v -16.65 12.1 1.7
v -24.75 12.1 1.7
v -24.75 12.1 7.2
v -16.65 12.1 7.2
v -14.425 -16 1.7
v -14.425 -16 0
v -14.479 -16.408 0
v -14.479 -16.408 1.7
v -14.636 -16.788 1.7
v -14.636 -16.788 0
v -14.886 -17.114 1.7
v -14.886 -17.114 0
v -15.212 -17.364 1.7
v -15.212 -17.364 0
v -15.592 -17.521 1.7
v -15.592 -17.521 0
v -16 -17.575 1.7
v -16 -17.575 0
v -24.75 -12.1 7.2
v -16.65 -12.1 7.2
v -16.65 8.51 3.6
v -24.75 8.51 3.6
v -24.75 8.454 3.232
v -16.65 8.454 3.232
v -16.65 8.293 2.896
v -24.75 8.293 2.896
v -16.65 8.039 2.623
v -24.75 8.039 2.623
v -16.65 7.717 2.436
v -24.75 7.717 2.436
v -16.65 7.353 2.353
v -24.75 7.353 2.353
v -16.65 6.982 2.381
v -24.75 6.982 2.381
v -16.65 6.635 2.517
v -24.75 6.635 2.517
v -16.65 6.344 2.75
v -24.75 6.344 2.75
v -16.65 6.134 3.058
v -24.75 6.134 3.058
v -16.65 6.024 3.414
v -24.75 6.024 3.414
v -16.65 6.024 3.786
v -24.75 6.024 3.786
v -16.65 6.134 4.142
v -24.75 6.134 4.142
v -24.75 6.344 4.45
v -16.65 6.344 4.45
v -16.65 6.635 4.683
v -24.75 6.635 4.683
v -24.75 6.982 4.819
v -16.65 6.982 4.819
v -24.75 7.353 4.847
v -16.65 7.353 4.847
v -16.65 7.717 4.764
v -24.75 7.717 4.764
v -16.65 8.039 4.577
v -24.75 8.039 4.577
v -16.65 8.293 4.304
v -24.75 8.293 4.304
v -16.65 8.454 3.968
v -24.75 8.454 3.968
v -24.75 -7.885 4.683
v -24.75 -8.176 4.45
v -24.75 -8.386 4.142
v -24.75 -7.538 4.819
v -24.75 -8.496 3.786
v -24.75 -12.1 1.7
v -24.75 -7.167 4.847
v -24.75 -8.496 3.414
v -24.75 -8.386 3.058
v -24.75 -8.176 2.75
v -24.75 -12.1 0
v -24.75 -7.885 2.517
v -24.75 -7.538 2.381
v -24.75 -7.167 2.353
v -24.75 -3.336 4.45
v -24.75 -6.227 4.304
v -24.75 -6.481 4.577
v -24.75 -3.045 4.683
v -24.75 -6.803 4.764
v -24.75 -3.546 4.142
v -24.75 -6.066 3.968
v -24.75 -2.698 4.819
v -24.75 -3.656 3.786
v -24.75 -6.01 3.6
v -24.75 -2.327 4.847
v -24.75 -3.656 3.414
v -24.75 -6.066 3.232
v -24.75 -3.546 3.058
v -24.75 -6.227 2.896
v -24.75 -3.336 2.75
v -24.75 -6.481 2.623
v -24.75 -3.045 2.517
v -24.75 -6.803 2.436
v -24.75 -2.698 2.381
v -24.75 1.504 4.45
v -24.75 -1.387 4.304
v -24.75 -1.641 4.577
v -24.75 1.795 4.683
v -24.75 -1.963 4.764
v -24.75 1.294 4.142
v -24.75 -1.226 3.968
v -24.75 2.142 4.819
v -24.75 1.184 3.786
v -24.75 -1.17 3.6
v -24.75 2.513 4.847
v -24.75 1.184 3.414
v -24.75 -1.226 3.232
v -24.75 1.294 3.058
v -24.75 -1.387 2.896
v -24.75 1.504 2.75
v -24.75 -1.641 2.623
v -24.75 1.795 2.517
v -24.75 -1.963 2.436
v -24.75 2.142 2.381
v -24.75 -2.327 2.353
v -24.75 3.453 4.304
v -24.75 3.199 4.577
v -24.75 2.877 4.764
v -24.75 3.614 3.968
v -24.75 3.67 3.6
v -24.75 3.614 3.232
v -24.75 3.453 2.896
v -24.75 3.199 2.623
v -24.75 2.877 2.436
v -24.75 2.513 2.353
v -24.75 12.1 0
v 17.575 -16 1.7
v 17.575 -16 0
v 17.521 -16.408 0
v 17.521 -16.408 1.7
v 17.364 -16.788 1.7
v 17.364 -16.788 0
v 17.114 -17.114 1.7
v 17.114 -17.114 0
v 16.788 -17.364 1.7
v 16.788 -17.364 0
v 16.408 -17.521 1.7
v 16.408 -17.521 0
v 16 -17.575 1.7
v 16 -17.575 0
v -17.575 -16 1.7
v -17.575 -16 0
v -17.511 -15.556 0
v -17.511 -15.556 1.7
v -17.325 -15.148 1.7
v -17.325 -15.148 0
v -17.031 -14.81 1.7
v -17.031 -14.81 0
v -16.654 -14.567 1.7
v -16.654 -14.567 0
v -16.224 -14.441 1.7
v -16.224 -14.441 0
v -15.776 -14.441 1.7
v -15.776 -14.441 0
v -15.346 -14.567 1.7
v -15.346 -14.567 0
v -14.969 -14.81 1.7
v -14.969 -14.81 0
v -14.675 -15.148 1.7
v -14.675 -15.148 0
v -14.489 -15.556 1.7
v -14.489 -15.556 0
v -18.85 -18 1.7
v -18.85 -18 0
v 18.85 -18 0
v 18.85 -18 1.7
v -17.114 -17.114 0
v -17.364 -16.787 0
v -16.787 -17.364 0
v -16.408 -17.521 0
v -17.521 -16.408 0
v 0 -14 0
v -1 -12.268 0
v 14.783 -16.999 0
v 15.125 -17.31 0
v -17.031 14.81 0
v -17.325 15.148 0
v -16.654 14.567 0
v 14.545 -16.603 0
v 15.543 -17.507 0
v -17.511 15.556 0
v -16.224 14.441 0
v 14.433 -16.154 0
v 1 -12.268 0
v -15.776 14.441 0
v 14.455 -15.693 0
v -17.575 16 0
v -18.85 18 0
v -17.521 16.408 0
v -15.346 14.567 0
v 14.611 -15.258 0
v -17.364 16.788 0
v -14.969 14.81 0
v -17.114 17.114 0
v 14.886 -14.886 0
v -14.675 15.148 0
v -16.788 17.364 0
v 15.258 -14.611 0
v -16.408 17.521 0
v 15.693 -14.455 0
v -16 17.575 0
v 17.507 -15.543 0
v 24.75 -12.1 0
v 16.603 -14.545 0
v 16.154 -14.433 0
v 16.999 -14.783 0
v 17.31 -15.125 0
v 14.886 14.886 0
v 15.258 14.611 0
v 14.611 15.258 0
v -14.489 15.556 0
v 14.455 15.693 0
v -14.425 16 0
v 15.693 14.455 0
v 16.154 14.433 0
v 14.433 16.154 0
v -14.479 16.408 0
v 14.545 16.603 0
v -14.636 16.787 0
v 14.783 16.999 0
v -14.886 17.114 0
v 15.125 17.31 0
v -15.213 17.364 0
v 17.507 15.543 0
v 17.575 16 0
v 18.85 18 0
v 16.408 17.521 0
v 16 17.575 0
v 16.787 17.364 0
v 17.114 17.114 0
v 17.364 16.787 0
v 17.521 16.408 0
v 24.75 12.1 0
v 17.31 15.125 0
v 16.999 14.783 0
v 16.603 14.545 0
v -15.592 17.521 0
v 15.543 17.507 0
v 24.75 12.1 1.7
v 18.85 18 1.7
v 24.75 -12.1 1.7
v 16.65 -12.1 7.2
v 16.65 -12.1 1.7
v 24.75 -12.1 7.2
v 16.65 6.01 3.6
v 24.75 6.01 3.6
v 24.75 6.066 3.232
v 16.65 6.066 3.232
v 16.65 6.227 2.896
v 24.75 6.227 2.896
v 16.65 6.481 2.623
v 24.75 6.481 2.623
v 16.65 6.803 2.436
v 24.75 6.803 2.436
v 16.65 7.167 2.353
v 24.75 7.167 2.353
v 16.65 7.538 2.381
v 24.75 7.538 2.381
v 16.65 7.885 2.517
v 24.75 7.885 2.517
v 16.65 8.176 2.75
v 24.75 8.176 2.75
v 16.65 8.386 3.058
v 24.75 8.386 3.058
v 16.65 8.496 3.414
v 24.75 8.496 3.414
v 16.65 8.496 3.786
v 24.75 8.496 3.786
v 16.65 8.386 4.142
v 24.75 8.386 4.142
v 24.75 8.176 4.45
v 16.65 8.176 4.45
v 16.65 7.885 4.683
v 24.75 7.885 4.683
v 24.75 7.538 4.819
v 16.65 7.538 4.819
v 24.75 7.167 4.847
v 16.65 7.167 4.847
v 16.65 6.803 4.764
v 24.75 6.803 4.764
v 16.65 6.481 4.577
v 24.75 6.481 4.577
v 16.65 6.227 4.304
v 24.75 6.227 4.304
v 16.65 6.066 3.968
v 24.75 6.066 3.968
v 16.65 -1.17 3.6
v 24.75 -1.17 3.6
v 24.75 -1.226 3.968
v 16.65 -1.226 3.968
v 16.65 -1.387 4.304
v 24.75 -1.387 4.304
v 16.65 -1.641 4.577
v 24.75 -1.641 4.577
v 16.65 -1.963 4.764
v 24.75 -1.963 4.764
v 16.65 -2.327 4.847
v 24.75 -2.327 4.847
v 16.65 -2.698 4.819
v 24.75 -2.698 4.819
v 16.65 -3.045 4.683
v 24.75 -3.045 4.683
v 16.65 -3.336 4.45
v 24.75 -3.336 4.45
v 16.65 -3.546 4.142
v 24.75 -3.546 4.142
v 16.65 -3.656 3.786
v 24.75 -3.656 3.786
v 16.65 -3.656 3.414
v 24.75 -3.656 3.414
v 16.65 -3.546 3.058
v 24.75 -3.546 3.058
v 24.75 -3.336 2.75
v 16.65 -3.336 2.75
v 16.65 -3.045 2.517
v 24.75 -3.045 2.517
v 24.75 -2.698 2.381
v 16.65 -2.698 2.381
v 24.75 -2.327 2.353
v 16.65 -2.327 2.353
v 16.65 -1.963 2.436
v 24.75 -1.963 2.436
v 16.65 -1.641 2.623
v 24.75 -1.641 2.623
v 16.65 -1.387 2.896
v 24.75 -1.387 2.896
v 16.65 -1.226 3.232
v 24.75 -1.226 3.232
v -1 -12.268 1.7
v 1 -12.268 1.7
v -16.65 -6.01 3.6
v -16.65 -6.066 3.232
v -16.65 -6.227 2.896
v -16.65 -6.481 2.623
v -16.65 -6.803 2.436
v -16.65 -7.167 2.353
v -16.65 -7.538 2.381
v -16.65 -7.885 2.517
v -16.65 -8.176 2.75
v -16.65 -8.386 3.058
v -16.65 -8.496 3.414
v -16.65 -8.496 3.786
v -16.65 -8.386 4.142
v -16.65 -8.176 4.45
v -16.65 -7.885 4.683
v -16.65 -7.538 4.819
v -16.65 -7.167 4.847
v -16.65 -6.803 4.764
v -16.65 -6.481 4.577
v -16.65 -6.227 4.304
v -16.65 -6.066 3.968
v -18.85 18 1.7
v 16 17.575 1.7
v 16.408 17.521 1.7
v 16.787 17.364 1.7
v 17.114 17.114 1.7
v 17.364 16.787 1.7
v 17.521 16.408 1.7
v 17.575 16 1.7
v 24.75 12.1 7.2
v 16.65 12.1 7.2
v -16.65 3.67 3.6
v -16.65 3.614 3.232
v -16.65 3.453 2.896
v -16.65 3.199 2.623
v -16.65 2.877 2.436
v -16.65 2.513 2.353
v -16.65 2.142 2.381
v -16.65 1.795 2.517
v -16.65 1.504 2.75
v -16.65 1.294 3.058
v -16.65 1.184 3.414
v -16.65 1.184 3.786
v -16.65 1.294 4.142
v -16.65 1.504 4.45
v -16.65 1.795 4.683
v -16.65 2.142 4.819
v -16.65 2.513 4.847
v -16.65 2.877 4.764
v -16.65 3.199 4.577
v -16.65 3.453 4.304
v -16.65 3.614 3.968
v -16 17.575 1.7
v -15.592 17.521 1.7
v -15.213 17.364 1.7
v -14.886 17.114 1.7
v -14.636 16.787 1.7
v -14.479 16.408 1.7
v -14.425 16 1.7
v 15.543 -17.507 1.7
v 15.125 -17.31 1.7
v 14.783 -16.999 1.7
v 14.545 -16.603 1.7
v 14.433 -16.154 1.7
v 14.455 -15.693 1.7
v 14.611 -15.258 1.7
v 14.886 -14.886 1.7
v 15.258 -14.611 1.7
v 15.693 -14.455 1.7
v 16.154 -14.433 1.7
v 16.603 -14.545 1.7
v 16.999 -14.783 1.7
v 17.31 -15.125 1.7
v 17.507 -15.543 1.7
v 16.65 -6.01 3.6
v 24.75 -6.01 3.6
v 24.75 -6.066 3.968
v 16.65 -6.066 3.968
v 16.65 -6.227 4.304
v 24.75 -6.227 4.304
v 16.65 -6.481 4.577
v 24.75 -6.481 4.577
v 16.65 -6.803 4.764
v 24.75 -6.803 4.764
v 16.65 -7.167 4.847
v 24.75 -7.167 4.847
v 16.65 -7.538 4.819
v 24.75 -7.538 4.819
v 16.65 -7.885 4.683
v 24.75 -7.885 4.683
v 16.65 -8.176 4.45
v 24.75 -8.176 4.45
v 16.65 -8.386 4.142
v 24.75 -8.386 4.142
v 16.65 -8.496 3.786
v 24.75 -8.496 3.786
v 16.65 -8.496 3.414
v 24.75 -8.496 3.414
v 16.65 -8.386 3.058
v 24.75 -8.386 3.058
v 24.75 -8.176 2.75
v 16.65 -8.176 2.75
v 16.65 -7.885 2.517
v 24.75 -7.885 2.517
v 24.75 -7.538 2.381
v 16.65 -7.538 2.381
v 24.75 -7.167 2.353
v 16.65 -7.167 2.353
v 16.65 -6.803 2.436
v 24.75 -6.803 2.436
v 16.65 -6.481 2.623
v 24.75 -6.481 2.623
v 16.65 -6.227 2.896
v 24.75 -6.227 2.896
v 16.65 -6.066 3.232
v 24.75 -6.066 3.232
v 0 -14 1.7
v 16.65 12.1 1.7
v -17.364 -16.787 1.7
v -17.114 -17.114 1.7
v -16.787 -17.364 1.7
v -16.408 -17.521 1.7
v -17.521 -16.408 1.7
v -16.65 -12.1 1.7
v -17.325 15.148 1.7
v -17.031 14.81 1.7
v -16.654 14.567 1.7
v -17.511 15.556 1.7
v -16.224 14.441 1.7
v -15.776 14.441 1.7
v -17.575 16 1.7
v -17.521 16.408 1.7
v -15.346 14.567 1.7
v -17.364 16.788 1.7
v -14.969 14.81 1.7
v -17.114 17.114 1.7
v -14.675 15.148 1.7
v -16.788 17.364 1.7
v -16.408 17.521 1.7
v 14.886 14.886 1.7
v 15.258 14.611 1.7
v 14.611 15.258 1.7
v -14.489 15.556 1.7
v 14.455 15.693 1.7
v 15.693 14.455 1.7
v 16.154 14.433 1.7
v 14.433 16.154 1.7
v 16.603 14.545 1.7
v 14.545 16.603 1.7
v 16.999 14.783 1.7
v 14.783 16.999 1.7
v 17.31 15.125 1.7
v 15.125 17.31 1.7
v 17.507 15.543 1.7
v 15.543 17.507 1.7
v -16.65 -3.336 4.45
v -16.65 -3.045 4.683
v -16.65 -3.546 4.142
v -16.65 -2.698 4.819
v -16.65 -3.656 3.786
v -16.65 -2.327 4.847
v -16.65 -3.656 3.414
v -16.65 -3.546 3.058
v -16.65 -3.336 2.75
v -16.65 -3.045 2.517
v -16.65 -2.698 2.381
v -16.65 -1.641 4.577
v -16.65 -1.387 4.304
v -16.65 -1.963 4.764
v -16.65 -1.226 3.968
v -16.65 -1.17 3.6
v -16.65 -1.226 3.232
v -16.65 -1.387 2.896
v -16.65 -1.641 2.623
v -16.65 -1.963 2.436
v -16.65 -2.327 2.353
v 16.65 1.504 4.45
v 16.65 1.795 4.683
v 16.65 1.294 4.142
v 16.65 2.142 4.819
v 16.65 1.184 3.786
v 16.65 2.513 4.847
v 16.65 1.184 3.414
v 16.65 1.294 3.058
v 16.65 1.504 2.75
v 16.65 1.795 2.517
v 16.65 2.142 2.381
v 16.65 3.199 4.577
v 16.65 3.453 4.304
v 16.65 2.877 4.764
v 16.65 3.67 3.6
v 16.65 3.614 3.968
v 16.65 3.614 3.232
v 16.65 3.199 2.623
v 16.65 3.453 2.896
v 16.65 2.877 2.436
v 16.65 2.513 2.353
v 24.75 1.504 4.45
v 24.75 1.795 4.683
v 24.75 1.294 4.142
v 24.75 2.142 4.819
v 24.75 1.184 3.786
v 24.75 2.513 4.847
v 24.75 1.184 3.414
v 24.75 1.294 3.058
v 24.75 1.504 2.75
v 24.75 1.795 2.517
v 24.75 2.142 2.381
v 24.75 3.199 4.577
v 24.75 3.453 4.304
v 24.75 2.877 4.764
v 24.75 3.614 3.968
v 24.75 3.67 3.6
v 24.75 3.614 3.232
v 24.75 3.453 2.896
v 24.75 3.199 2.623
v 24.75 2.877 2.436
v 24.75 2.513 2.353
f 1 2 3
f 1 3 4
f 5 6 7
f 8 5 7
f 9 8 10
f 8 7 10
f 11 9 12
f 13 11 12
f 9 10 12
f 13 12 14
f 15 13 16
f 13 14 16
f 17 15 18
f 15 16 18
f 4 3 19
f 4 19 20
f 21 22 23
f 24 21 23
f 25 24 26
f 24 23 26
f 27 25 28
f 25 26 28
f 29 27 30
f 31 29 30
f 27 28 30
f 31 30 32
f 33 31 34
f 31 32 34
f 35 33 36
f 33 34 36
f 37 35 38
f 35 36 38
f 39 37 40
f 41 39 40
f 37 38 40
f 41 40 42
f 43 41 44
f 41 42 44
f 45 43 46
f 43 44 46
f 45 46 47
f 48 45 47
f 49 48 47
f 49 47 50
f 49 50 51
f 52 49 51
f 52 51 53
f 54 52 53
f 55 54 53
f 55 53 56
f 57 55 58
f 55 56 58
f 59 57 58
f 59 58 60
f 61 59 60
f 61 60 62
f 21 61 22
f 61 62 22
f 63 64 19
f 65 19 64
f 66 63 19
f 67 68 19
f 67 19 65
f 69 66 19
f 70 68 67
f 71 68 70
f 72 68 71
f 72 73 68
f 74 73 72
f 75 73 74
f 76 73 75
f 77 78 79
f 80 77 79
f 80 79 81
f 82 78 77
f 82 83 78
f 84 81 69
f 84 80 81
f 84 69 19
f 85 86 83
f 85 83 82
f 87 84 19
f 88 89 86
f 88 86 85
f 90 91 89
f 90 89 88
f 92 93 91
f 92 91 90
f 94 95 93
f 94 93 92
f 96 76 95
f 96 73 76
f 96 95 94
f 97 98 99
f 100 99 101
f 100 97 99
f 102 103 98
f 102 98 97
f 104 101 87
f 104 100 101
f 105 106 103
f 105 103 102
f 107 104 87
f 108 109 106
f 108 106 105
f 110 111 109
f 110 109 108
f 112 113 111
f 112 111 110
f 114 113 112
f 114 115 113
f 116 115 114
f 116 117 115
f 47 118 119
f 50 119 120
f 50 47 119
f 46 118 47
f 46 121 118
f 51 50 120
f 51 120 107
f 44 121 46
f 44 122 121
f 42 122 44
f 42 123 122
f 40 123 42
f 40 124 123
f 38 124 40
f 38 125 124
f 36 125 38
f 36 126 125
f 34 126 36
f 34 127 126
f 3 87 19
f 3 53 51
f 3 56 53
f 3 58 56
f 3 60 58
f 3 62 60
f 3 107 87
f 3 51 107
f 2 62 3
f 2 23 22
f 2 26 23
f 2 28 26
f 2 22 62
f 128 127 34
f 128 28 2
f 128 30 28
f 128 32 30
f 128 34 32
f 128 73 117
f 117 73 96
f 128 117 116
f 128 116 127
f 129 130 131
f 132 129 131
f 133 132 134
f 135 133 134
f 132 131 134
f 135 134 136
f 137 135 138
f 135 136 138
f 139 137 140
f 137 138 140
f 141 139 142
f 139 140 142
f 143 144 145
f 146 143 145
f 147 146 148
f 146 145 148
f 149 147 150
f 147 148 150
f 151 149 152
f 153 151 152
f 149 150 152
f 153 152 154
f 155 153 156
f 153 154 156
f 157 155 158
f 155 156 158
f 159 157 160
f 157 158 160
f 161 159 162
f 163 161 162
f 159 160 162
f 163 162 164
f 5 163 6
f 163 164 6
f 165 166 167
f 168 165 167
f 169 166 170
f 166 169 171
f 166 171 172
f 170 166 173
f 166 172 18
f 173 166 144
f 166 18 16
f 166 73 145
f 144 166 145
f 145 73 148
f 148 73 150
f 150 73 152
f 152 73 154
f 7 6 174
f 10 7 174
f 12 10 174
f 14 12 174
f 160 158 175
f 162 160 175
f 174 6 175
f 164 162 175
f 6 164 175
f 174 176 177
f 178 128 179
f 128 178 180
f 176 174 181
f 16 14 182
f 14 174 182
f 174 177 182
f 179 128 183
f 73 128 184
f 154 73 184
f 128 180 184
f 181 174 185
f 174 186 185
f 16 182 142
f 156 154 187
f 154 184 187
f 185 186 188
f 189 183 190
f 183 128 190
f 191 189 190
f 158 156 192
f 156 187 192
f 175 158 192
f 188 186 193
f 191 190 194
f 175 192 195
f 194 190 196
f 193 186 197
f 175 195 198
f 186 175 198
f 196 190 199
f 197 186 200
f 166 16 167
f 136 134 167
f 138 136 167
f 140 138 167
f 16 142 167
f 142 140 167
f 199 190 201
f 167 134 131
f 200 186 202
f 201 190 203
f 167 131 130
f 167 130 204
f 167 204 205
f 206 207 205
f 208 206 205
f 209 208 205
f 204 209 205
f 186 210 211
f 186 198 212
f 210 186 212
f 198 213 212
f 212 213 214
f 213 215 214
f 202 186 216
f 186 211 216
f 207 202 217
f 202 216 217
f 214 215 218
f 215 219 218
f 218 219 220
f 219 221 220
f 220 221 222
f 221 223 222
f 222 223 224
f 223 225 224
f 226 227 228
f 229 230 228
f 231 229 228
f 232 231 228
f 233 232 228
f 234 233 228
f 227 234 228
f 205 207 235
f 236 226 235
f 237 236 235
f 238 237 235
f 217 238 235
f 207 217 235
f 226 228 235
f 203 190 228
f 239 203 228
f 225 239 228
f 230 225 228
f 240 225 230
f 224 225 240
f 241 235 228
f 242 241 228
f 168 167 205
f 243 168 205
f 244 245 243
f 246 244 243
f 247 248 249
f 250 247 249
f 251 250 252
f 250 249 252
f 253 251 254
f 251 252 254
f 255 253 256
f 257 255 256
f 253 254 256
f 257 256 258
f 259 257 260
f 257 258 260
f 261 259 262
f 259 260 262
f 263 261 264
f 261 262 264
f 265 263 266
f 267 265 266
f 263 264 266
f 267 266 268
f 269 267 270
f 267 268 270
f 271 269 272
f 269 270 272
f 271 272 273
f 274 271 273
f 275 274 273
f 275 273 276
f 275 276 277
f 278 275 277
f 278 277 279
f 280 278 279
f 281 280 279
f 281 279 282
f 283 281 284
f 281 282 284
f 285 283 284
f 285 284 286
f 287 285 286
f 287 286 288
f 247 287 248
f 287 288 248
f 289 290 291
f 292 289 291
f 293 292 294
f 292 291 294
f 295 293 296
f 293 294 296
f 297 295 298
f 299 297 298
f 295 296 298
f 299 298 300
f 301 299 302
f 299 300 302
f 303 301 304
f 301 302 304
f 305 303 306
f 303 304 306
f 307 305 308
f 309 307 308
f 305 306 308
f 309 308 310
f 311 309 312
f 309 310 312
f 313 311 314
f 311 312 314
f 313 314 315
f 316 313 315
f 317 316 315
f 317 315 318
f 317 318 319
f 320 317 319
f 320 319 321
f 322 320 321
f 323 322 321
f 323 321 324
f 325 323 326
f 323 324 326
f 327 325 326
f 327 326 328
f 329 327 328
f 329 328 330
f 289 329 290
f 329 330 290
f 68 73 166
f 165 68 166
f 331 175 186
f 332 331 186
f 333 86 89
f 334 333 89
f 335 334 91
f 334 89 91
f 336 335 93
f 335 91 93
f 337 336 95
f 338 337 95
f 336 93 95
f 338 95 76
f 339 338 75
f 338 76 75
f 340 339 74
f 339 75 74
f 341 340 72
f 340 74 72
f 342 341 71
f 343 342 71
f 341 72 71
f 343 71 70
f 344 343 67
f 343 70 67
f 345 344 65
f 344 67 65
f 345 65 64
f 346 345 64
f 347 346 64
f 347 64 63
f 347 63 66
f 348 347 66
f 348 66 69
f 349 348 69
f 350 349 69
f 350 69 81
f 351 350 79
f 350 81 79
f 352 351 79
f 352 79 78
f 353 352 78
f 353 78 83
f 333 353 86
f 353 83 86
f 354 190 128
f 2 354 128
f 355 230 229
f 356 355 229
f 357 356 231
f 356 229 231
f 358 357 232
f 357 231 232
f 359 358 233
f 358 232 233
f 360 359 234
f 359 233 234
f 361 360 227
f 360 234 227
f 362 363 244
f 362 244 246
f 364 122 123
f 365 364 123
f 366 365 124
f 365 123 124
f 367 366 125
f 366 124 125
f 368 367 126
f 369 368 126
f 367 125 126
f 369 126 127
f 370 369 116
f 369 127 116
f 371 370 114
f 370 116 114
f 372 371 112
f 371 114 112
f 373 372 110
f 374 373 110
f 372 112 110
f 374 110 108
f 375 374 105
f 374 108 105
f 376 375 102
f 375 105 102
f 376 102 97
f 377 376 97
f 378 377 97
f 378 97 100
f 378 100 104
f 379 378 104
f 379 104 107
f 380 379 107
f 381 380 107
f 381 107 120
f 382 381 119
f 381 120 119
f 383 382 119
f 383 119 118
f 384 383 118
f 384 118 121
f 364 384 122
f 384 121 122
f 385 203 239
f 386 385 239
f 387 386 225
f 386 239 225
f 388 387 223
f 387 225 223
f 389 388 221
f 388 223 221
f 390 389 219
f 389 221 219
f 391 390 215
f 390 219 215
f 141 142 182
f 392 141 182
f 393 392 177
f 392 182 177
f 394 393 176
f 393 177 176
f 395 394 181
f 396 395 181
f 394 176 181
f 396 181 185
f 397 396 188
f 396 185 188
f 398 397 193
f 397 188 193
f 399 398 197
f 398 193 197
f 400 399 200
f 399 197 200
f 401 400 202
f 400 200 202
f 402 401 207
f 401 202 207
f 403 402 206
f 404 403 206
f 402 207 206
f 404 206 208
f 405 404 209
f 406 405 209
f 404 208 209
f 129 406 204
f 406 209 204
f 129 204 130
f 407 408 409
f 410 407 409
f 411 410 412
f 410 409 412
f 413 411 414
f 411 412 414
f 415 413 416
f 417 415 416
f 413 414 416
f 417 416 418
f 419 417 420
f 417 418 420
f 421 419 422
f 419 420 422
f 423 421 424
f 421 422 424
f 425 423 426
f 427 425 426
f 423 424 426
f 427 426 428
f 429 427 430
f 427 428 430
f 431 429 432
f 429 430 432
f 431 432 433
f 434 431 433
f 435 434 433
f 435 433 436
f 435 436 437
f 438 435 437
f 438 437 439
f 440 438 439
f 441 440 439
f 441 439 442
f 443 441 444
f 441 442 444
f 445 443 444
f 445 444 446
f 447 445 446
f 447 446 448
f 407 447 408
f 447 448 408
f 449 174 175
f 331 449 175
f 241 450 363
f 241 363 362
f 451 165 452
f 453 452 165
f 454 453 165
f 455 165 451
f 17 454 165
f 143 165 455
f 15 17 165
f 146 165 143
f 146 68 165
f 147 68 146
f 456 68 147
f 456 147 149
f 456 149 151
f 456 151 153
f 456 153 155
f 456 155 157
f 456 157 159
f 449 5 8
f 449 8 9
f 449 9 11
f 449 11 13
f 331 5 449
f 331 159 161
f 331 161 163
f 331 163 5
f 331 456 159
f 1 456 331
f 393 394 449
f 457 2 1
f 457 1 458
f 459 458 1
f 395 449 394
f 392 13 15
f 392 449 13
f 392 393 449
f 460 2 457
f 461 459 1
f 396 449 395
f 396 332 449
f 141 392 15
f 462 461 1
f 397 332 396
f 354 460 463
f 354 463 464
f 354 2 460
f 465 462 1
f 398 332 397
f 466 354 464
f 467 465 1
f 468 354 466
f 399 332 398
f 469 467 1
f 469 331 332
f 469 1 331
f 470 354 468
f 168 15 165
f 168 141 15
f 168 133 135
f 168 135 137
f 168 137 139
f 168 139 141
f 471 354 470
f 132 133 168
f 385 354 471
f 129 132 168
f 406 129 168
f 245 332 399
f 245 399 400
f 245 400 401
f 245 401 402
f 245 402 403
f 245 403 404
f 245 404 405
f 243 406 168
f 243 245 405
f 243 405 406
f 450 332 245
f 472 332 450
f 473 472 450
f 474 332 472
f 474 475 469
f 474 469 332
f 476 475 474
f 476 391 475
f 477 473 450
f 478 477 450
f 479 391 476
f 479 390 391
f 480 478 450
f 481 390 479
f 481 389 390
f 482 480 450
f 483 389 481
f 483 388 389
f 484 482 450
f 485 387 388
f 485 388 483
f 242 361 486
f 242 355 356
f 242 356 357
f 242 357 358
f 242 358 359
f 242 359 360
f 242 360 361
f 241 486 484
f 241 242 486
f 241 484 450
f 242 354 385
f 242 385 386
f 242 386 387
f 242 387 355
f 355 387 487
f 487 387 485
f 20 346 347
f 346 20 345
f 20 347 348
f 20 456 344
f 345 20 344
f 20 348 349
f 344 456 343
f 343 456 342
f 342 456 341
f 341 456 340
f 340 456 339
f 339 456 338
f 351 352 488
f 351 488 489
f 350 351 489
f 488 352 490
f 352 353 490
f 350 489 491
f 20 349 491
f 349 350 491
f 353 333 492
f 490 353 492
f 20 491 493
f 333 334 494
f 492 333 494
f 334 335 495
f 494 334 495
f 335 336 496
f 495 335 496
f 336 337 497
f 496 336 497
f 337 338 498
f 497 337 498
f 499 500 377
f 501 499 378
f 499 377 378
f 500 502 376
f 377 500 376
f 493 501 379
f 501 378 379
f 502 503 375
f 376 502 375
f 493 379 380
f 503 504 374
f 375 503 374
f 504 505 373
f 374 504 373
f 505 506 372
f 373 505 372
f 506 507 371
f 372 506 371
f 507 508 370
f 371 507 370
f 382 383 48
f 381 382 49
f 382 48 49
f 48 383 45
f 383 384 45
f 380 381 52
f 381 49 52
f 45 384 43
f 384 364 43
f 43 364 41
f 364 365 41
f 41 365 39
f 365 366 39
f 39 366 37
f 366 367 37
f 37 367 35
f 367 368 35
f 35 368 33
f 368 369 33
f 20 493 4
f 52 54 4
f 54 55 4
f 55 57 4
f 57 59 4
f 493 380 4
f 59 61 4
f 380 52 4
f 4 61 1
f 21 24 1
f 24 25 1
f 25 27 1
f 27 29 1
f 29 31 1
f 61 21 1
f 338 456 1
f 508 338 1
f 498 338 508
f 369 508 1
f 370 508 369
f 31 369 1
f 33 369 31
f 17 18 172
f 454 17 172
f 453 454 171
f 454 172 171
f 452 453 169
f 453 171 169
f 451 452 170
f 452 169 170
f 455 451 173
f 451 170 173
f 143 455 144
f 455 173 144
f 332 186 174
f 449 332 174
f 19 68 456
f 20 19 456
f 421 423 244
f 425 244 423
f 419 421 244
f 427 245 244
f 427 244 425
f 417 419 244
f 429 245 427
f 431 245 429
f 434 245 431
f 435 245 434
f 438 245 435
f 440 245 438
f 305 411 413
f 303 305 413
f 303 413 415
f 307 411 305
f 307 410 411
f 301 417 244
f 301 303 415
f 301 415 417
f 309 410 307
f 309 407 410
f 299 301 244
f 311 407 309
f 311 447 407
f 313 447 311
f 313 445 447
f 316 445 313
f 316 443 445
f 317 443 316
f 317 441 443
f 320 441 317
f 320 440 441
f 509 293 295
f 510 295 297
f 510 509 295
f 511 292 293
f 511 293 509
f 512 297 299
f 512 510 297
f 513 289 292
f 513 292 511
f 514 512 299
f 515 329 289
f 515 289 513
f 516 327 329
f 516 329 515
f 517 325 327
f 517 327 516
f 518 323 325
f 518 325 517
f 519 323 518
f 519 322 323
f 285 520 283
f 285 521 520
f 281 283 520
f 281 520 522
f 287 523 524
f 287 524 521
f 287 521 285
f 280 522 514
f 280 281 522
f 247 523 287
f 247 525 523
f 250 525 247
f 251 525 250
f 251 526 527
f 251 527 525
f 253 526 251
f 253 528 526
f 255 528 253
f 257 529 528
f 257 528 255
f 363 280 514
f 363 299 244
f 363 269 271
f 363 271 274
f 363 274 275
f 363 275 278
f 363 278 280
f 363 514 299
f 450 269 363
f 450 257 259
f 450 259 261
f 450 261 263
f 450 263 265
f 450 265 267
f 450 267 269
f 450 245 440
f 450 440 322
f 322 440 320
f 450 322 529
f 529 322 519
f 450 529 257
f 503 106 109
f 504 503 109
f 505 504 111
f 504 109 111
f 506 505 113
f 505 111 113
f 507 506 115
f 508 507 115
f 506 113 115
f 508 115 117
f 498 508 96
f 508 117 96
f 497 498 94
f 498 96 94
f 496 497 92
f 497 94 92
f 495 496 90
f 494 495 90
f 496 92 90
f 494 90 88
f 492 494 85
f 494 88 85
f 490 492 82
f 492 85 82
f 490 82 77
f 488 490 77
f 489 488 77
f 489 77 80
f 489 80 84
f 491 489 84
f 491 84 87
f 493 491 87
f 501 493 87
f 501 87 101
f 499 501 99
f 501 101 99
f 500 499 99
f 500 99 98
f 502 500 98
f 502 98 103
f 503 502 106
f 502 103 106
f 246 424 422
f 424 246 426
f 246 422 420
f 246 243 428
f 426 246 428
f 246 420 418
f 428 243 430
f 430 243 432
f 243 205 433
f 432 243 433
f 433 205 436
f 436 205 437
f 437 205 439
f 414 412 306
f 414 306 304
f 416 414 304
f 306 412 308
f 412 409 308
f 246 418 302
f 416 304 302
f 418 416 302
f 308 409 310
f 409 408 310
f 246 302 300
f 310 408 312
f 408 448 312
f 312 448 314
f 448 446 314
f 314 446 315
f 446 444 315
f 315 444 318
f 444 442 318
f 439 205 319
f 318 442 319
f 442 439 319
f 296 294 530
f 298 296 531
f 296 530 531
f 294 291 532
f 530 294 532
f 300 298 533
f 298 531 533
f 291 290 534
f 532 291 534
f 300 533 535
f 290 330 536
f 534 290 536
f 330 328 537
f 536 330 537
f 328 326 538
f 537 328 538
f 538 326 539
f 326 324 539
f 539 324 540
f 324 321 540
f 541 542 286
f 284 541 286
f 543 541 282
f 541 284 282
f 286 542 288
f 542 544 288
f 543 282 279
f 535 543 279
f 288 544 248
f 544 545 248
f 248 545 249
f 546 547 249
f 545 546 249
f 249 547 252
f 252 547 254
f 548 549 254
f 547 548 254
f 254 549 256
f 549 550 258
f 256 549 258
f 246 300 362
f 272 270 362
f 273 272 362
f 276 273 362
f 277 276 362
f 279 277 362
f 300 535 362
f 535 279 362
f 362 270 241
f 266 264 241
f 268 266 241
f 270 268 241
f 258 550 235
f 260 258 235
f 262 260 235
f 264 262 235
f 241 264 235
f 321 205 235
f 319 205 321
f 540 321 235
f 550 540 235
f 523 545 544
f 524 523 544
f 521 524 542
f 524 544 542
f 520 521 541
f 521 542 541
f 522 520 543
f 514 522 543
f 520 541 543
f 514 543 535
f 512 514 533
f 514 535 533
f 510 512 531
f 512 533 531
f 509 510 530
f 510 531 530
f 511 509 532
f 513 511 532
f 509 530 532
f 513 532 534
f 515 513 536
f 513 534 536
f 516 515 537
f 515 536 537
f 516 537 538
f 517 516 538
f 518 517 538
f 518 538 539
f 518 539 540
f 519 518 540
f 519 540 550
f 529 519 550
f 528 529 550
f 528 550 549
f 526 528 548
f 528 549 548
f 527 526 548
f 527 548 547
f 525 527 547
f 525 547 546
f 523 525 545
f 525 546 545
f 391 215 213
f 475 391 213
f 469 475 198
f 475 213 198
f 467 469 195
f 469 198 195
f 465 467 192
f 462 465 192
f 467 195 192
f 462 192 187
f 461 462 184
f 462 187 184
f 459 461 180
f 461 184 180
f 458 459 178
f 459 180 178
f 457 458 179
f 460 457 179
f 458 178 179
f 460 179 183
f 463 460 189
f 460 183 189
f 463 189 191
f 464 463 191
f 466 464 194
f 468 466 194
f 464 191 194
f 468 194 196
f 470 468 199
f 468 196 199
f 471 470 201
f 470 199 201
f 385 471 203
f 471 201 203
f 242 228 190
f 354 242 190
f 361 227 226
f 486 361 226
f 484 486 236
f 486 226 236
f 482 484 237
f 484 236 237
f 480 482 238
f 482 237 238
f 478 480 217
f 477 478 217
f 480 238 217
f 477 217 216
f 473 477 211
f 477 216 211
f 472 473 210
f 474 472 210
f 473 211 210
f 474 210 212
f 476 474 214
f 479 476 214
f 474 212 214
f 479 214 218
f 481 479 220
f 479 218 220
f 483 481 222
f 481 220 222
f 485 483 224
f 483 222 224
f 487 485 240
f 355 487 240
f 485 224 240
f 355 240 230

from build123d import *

# Parameters (mm, degrees)
F1_DEPTH = 1.7
F2_W     = 8.1
F2_H     = 24.2000000085
F3_DEPTH = 5.5
F6_DEPTH = 8.1
F7_DEPTH = 8.1


with BuildPart() as f1:
    # F0 (on Top) → F1 (new body)
    with BuildSketch(Plane.XY):
        with BuildLine():
            ThreePointArc((-17.5750000042, 16), (-17.1136931846, 17.1136931804), (-16.0000000042, 17.575))
            Line((-16.0000000042, 17.575), (-16.0000000042, 18))
            Line((-16.0000000042, 18), (-18.8500000085, 18))
            Line((-18.8500000085, 18), (-20.8500000085, 16))
            Line((-20.8500000085, 16), (-17.5750000042, 16))
        make_face()
        with BuildLine():
            ThreePointArc((-16.0000000042, 17.575), (-14.8863068239, 17.1136931804), (-14.4250000042, 16))
            ThreePointArc((-14.4250000042, 16), (-16.0000000042, 14.425), (-17.5750000042, 16))
            Line((-17.5750000042, 16), (-20.8500000085, 16))
            Line((-20.8500000085, 16), (-24.75, 12.1000000085))
            Line((-24.75, 12.1000000085), (-24.75, -12.1))
            Line((-24.75, -12.1), (-20.85, -16))
            Line((-20.85, -16), (-17.5749999958, -16))
            ThreePointArc((-17.5749999958, -16), (-15.9999999958, -14.425), (-14.4249999958, -16))
            ThreePointArc((-14.4249999958, -16), (-14.8863068154, -17.1136931804), (-15.9999999958, -17.575))
            Line((-15.9999999958, -17.575), (-15.9999999958, -18))
            Line((-15.9999999958, -18), (16.0000000042, -18))
            Line((16.0000000042, -18), (16.0000000042, -17.575))
            ThreePointArc((16.0000000042, -17.575), (14.8863068239, -14.8863068196), (17.5750000042, -16))
            Line((17.5750000042, -16), (20.8500000085, -16))
            Line((20.8500000085, -16), (24.75, -12.1000000085))
            Line((24.75, -12.1000000085), (24.75, 12.1))
            Line((24.75, 12.1), (20.85, 16))
            Line((20.85, 16), (17.5749999958, 16))
            ThreePointArc((17.5749999958, 16), (14.8863068154, 14.8863068196), (15.9999999958, 17.575))
            Line((15.9999999958, 17.575), (15.9999999958, 18))
            Line((15.9999999958, 18), (-16.0000000042, 18))
            Line((-16.0000000042, 18), (-16.0000000042, 17.575))
        make_face()
        Polygon((1, -12.2679491924), (0, -14), (-1, -12.2679491924), align=None, mode=Mode.SUBTRACT)
        with BuildLine():
            Line((18.85, 18), (15.9999999958, 18))
            Line((15.9999999958, 18), (15.9999999958, 17.575))
            ThreePointArc((15.9999999958, 17.575), (17.1136931761, 17.1136931804), (17.5749999958, 16))
            Line((17.5749999958, 16), (20.85, 16))
            Line((20.85, 16), (18.85, 18))
        make_face()
        with BuildLine():
            Line((18.8500000085, -18), (20.8500000085, -16))
            Line((20.8500000085, -16), (17.5750000042, -16))
            ThreePointArc((17.5750000042, -16), (17.1136931846, -17.1136931804), (16.0000000042, -17.575))
            Line((16.0000000042, -17.575), (16.0000000042, -18))
            Line((16.0000000042, -18), (18.8500000085, -18))
        make_face()
        with BuildLine():
            Line((-17.5749999958, -16), (-20.85, -16))
            Line((-20.85, -16), (-18.85, -18))
            Line((-18.85, -18), (-15.9999999958, -18))
            Line((-15.9999999958, -18), (-15.9999999958, -17.575))
            ThreePointArc((-15.9999999958, -17.575), (-17.1136931761, -17.1136931804), (-17.5749999958, -16))
        make_face()
    extrude(amount=F1_DEPTH)

    # F2 (on face) → F3 (join)
    with BuildSketch(Plane.XY.offset(1.7)):
        with Locations((-20.7, 4.2e-09)):
            Rectangle(F2_W, F2_H)
        with Locations((20.7, -4.2e-09)):
            Rectangle(F2_W, F2_H)
    extrude(amount=F3_DEPTH)

    # F5 (on face) → F6 (cut)
    with BuildSketch(Plane.YZ.offset(24.75)):
        with BuildLine():
            Line((6.0099999915, 3.6), (8.5099999915, 3.6))
            ThreePointArc((8.5099999915, 3.6), (7.2599999915, 4.85), (6.0099999915, 3.6))
        make_face()
        with BuildLine():
            ThreePointArc((6.0099999915, 3.6), (7.2599999915, 2.35), (8.5099999915, 3.6))
            Line((8.5099999915, 3.6), (6.0099999915, 3.6))
        make_face()
        with BuildLine():
            ThreePointArc((1.1699999915, 3.6), (2.4199999915, 2.35), (3.6699999915, 3.6))
            Line((3.6699999915, 3.6), (1.1699999915, 3.6))
        make_face()
        with BuildLine():
            Line((1.1699999915, 3.6), (3.6699999915, 3.6))
            ThreePointArc((3.6699999915, 3.6), (2.4199999915, 4.85), (1.1699999915, 3.6))
        make_face()
        with BuildLine():
            ThreePointArc((-3.6700000085, 3.6), (-2.4200000085, 2.35), (-1.1700000085, 3.6))
            Line((-1.1700000085, 3.6), (-3.6700000085, 3.6))
        make_face()
        with BuildLine():
            Line((-3.6700000085, 3.6), (-1.1700000085, 3.6))
            ThreePointArc((-1.1700000085, 3.6), (-2.4200000085, 4.85), (-3.6700000085, 3.6))
        make_face()
        with BuildLine():
            Line((-6.0100000085, 3.6), (-8.5100000085, 3.6))
            ThreePointArc((-8.5100000085, 3.6), (-7.2600000085, 2.35), (-6.0100000085, 3.6))
        make_face()
        with BuildLine():
            ThreePointArc((-6.0100000085, 3.6), (-7.2600000085, 4.85), (-8.5100000085, 3.6))
            Line((-8.5100000085, 3.6), (-6.0100000085, 3.6))
        make_face()
    extrude(amount=-F6_DEPTH, mode=Mode.SUBTRACT)

    # F4 (on face) → F7 (cut)
    with BuildSketch(Plane(origin=(-24.75, 0, 0), x_dir=(0, -1, 0), z_dir=(-1, 0, 0))):
        with BuildLine():
            Line((6.0099999915, 3.6), (8.5099999915, 3.6))
            ThreePointArc((8.5099999915, 3.6), (7.2599999915, 4.85), (6.0099999915, 3.6))
        make_face()
        with BuildLine():
            ThreePointArc((6.0099999915, 3.6), (7.2599999915, 2.35), (8.5099999915, 3.6))
            Line((8.5099999915, 3.6), (6.0099999915, 3.6))
        make_face()
        with BuildLine():
            Line((1.1699999915, 3.6), (3.6699999915, 3.6))
            ThreePointArc((3.6699999915, 3.6), (2.4199999915, 4.85), (1.1699999915, 3.6))
        make_face()
        with BuildLine():
            ThreePointArc((1.1699999915, 3.6), (2.4199999915, 2.35), (3.6699999915, 3.6))
            Line((3.6699999915, 3.6), (1.1699999915, 3.6))
        make_face()
        with BuildLine():
            Line((-3.6700000085, 3.6), (-1.1700000085, 3.6))
            ThreePointArc((-1.1700000085, 3.6), (-2.4200000085, 4.85), (-3.6700000085, 3.6))
        make_face()
        with BuildLine():
            ThreePointArc((-3.6700000085, 3.6), (-2.4200000085, 2.35), (-1.1700000085, 3.6))
            Line((-1.1700000085, 3.6), (-3.6700000085, 3.6))
        make_face()
        with BuildLine():
            ThreePointArc((-6.0100000085, 3.6), (-7.2600000085, 4.85), (-8.5100000085, 3.6))
            Line((-8.5100000085, 3.6), (-6.0100000085, 3.6))
        make_face()
        with BuildLine():
            Line((-6.0100000085, 3.6), (-8.5100000085, 3.6))
            ThreePointArc((-8.5100000085, 3.6), (-7.2600000085, 2.35), (-6.0100000085, 3.6))
        make_face()
    extrude(amount=-F7_DEPTH, mode=Mode.SUBTRACT)


solid = f1.part
